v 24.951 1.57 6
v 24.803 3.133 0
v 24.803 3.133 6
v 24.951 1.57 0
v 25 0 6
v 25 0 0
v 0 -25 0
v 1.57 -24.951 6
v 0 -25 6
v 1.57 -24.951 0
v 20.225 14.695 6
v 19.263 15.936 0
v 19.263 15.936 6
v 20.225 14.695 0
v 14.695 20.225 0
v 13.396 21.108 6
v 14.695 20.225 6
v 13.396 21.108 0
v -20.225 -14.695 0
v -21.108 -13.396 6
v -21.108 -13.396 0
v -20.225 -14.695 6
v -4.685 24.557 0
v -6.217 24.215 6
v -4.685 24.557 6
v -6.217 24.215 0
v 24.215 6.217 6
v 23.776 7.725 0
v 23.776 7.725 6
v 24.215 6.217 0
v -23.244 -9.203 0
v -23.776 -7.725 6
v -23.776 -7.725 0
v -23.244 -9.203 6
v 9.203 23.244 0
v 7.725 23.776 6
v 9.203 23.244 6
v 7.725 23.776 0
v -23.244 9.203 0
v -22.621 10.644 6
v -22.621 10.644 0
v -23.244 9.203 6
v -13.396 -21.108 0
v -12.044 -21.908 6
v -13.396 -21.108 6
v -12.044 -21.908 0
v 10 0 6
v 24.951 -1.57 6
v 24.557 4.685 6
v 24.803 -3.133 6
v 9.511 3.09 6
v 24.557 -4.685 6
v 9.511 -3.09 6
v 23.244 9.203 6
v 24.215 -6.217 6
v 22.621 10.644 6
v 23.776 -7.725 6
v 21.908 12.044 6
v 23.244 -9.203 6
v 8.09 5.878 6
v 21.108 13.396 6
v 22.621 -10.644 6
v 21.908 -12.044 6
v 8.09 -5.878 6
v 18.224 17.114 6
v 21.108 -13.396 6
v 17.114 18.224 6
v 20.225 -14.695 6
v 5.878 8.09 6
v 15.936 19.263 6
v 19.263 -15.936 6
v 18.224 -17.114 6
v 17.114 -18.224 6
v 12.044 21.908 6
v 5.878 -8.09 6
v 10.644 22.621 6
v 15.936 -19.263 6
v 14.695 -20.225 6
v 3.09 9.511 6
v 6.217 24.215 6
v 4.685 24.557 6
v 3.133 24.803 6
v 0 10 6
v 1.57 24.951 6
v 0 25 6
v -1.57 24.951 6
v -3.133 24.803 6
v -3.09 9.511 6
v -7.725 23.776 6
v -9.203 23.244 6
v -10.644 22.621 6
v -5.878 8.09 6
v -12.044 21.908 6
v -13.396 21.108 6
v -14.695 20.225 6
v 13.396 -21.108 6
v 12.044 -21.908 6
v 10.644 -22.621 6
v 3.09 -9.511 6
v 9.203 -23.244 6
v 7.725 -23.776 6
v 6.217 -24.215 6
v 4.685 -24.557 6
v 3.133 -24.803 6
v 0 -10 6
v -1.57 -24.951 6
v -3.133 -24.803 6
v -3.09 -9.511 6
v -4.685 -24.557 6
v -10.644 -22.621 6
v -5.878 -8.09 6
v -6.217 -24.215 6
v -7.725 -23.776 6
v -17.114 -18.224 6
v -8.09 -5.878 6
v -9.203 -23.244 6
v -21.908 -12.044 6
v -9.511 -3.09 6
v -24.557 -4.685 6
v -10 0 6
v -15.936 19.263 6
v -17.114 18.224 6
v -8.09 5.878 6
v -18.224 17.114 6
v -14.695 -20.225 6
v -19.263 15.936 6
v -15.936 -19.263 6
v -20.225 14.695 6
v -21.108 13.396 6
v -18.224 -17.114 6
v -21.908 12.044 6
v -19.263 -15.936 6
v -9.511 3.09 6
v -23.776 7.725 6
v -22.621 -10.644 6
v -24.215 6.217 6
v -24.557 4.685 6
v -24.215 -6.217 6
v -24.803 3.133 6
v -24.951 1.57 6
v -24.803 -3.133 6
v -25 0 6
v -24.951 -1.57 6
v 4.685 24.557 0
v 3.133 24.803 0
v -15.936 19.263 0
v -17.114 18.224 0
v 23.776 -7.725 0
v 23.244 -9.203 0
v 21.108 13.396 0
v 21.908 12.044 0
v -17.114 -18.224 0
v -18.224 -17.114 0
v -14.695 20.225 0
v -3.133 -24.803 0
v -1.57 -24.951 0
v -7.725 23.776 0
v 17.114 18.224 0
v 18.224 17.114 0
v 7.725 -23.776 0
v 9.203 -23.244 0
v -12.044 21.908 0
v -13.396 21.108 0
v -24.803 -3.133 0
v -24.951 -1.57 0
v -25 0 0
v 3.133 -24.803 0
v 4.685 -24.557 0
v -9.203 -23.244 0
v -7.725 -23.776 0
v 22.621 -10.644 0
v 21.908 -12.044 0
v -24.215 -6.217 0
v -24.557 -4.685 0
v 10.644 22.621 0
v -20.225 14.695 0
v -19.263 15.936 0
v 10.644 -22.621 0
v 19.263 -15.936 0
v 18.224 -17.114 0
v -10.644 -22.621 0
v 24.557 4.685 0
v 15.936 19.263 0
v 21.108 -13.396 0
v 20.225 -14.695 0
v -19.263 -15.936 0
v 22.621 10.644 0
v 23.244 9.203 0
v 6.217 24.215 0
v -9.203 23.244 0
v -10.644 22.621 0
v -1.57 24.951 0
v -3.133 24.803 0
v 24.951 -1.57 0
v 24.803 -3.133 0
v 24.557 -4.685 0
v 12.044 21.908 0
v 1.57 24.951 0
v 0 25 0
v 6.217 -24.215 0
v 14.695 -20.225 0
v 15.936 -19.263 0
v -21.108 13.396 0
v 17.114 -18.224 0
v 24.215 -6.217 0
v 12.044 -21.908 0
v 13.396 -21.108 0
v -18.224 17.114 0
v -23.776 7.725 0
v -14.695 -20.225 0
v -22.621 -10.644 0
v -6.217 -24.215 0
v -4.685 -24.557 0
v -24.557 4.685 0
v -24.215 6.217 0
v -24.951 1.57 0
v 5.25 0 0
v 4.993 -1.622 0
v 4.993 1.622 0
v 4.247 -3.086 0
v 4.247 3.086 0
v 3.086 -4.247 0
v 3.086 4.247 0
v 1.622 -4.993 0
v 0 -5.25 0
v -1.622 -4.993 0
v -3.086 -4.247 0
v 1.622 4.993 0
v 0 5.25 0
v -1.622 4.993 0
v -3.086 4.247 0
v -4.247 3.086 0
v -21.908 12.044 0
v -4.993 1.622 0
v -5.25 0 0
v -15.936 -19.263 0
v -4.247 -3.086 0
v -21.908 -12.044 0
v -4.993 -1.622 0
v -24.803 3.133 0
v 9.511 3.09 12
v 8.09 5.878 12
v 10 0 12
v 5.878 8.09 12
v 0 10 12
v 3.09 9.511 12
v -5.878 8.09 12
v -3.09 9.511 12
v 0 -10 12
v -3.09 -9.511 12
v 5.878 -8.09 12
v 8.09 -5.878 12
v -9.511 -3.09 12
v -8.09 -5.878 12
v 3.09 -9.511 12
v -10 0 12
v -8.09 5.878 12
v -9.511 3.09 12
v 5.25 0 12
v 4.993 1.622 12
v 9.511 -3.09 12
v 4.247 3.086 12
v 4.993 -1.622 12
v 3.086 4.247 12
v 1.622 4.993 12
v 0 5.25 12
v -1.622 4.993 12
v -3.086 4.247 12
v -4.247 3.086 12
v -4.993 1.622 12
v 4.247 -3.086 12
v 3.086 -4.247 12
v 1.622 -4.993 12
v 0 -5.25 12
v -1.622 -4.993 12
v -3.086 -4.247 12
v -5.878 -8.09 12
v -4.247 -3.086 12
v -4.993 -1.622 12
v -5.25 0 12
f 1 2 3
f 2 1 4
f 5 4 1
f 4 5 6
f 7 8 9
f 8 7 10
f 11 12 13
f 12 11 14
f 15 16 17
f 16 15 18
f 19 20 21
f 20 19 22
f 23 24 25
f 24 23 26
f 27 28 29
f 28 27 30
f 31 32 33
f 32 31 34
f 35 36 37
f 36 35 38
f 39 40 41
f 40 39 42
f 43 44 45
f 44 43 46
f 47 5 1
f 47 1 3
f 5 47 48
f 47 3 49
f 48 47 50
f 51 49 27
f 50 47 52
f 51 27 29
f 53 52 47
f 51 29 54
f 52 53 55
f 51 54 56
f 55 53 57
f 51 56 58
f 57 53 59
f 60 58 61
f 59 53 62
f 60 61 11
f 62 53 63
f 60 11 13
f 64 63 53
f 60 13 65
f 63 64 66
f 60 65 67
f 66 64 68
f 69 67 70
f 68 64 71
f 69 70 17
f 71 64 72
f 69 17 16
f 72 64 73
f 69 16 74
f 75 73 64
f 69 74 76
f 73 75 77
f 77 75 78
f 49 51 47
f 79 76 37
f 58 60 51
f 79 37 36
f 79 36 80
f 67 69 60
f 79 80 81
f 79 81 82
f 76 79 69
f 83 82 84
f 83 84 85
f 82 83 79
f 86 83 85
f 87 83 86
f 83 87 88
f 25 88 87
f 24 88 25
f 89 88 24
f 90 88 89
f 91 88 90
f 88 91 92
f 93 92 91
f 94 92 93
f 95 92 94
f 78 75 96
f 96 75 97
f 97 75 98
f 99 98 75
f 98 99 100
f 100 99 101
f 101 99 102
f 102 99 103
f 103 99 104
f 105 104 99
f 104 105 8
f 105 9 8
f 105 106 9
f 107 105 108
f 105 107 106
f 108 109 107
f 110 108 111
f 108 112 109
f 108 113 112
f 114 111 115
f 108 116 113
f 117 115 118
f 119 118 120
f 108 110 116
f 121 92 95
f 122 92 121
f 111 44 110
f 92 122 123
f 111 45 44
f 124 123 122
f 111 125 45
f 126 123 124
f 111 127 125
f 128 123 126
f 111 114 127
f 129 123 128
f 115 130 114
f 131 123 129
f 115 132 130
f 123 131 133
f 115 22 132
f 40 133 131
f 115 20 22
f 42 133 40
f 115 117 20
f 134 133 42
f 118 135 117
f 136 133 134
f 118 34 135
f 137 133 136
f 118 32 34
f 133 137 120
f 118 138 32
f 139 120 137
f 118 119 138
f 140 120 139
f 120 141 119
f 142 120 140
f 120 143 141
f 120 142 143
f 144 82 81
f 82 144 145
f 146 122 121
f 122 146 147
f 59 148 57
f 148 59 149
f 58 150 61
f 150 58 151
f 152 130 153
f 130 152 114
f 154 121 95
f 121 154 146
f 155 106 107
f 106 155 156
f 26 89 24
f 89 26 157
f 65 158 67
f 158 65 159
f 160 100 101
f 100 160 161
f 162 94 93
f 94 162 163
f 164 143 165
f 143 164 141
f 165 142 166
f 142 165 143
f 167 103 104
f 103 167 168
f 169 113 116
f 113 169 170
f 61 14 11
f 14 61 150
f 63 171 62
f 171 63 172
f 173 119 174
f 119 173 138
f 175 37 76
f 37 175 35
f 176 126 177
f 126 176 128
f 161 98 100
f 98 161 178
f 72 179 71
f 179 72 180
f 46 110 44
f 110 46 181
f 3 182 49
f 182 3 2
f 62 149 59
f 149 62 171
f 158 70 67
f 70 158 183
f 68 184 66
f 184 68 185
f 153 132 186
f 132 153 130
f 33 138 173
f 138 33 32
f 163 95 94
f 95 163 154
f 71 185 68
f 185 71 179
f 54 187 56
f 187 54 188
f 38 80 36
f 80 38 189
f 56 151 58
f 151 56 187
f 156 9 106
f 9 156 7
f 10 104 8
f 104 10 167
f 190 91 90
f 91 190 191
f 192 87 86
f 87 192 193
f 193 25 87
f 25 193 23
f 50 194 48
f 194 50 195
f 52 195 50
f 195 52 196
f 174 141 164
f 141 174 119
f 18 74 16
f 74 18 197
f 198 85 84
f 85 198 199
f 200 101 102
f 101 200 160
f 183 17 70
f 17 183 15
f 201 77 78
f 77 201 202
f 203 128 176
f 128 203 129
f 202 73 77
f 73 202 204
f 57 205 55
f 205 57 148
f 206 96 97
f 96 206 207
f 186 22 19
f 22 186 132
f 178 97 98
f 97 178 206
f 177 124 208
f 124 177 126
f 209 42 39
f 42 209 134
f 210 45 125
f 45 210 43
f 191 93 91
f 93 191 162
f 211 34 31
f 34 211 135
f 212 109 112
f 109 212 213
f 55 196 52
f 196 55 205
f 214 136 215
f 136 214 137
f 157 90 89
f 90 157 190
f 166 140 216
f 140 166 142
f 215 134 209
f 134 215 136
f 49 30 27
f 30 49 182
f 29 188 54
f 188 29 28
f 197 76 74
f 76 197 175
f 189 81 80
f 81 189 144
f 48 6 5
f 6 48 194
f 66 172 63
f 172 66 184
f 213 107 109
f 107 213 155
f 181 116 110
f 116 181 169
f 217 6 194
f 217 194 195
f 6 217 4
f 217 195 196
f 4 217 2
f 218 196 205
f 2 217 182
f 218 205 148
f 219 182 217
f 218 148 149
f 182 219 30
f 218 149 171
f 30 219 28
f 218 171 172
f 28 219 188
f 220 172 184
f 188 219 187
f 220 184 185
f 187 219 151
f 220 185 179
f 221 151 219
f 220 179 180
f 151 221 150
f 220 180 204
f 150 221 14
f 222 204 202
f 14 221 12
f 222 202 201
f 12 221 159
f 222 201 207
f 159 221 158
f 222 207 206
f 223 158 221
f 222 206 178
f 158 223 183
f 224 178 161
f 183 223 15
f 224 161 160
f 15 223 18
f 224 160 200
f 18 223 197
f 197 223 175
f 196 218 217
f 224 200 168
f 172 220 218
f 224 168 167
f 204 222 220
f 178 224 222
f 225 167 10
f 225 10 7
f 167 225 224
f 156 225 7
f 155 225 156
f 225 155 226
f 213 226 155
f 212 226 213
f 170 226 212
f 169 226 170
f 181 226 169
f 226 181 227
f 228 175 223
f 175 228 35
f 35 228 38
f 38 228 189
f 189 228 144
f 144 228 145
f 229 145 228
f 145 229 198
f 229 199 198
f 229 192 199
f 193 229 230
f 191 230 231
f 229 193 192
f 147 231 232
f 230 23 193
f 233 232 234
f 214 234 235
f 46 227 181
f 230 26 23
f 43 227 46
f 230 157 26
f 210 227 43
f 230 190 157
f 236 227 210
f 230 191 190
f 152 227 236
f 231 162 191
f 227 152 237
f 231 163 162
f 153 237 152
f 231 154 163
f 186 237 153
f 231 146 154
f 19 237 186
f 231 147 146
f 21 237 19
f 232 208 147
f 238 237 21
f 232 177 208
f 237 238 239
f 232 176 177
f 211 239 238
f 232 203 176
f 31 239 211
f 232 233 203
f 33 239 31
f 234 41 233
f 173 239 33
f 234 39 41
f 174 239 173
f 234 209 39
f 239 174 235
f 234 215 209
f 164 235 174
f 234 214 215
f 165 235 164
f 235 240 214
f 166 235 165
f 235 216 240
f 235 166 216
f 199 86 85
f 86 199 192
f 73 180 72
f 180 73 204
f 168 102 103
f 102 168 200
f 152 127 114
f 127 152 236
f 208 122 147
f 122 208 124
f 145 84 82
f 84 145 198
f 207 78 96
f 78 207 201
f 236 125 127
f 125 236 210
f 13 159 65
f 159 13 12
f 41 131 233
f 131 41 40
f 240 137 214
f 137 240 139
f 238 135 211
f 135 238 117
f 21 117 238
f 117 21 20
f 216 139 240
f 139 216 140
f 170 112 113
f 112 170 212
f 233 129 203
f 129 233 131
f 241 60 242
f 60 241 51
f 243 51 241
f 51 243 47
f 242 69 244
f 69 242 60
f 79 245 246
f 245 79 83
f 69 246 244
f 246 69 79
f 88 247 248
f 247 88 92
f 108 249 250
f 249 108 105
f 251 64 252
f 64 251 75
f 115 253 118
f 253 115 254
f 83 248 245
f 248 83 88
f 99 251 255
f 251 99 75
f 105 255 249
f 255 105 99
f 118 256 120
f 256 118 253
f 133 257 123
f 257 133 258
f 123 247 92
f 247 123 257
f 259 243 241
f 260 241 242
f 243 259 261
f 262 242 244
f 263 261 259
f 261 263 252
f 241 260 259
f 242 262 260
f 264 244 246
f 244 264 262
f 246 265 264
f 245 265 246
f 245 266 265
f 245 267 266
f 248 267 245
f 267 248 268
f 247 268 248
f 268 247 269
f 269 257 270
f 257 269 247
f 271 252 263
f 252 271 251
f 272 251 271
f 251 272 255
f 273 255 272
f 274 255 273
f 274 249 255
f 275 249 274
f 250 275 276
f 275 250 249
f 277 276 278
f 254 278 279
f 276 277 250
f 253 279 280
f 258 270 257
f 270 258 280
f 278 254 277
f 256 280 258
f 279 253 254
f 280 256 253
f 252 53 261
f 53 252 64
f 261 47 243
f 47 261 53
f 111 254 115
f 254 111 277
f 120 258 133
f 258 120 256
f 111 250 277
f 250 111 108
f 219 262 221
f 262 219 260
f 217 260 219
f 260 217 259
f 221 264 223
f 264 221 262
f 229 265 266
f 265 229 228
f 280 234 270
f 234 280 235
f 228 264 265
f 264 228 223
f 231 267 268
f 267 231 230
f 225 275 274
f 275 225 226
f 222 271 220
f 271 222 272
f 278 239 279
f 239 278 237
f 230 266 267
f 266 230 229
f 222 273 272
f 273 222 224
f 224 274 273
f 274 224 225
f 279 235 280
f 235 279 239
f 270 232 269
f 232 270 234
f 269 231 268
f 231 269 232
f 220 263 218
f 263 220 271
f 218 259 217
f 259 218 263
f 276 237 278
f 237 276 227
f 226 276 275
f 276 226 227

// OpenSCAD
//RUEDA con radios 
//parametros rueda

//medidas del aro externo de la rueda.
diametro=50; //diametro externo de la rueda. influye en la velocidad.
grosor=6;	// grosor del aro externo de la rueda

//medidas de los radios
//grosor_radios=8; //grosor o altura de los radios

//medidas del hub central
//diam_eje=4;  //eje central por el que pasa el tornillo de izquierdas



//medidas de los agujeros del hub
metrica_hub=3;

module rueda(gros=grosor, diam=diametro)
{
	difference(){
		
				union(){
				//parte exterior y radios
				cylinder (r=diam/2, h=gros, $fn=100);
				cylinder (r=20/2, h=grosor+6, $fn=20);
				}
				cylinder (r=10.5/2, h=100, $fn=20, center=true);
				//translate([8,0,0])
				//cylinder (r=3.5/2, h=100, $fn=20, center=true);
				//translate([-8,0,0])
				//cylinder (r=3.5/2, h=100, $fn=20, center=true);
			
	}//fin diference
}




	//rueda en si
	rueda();
	
	
		

	
